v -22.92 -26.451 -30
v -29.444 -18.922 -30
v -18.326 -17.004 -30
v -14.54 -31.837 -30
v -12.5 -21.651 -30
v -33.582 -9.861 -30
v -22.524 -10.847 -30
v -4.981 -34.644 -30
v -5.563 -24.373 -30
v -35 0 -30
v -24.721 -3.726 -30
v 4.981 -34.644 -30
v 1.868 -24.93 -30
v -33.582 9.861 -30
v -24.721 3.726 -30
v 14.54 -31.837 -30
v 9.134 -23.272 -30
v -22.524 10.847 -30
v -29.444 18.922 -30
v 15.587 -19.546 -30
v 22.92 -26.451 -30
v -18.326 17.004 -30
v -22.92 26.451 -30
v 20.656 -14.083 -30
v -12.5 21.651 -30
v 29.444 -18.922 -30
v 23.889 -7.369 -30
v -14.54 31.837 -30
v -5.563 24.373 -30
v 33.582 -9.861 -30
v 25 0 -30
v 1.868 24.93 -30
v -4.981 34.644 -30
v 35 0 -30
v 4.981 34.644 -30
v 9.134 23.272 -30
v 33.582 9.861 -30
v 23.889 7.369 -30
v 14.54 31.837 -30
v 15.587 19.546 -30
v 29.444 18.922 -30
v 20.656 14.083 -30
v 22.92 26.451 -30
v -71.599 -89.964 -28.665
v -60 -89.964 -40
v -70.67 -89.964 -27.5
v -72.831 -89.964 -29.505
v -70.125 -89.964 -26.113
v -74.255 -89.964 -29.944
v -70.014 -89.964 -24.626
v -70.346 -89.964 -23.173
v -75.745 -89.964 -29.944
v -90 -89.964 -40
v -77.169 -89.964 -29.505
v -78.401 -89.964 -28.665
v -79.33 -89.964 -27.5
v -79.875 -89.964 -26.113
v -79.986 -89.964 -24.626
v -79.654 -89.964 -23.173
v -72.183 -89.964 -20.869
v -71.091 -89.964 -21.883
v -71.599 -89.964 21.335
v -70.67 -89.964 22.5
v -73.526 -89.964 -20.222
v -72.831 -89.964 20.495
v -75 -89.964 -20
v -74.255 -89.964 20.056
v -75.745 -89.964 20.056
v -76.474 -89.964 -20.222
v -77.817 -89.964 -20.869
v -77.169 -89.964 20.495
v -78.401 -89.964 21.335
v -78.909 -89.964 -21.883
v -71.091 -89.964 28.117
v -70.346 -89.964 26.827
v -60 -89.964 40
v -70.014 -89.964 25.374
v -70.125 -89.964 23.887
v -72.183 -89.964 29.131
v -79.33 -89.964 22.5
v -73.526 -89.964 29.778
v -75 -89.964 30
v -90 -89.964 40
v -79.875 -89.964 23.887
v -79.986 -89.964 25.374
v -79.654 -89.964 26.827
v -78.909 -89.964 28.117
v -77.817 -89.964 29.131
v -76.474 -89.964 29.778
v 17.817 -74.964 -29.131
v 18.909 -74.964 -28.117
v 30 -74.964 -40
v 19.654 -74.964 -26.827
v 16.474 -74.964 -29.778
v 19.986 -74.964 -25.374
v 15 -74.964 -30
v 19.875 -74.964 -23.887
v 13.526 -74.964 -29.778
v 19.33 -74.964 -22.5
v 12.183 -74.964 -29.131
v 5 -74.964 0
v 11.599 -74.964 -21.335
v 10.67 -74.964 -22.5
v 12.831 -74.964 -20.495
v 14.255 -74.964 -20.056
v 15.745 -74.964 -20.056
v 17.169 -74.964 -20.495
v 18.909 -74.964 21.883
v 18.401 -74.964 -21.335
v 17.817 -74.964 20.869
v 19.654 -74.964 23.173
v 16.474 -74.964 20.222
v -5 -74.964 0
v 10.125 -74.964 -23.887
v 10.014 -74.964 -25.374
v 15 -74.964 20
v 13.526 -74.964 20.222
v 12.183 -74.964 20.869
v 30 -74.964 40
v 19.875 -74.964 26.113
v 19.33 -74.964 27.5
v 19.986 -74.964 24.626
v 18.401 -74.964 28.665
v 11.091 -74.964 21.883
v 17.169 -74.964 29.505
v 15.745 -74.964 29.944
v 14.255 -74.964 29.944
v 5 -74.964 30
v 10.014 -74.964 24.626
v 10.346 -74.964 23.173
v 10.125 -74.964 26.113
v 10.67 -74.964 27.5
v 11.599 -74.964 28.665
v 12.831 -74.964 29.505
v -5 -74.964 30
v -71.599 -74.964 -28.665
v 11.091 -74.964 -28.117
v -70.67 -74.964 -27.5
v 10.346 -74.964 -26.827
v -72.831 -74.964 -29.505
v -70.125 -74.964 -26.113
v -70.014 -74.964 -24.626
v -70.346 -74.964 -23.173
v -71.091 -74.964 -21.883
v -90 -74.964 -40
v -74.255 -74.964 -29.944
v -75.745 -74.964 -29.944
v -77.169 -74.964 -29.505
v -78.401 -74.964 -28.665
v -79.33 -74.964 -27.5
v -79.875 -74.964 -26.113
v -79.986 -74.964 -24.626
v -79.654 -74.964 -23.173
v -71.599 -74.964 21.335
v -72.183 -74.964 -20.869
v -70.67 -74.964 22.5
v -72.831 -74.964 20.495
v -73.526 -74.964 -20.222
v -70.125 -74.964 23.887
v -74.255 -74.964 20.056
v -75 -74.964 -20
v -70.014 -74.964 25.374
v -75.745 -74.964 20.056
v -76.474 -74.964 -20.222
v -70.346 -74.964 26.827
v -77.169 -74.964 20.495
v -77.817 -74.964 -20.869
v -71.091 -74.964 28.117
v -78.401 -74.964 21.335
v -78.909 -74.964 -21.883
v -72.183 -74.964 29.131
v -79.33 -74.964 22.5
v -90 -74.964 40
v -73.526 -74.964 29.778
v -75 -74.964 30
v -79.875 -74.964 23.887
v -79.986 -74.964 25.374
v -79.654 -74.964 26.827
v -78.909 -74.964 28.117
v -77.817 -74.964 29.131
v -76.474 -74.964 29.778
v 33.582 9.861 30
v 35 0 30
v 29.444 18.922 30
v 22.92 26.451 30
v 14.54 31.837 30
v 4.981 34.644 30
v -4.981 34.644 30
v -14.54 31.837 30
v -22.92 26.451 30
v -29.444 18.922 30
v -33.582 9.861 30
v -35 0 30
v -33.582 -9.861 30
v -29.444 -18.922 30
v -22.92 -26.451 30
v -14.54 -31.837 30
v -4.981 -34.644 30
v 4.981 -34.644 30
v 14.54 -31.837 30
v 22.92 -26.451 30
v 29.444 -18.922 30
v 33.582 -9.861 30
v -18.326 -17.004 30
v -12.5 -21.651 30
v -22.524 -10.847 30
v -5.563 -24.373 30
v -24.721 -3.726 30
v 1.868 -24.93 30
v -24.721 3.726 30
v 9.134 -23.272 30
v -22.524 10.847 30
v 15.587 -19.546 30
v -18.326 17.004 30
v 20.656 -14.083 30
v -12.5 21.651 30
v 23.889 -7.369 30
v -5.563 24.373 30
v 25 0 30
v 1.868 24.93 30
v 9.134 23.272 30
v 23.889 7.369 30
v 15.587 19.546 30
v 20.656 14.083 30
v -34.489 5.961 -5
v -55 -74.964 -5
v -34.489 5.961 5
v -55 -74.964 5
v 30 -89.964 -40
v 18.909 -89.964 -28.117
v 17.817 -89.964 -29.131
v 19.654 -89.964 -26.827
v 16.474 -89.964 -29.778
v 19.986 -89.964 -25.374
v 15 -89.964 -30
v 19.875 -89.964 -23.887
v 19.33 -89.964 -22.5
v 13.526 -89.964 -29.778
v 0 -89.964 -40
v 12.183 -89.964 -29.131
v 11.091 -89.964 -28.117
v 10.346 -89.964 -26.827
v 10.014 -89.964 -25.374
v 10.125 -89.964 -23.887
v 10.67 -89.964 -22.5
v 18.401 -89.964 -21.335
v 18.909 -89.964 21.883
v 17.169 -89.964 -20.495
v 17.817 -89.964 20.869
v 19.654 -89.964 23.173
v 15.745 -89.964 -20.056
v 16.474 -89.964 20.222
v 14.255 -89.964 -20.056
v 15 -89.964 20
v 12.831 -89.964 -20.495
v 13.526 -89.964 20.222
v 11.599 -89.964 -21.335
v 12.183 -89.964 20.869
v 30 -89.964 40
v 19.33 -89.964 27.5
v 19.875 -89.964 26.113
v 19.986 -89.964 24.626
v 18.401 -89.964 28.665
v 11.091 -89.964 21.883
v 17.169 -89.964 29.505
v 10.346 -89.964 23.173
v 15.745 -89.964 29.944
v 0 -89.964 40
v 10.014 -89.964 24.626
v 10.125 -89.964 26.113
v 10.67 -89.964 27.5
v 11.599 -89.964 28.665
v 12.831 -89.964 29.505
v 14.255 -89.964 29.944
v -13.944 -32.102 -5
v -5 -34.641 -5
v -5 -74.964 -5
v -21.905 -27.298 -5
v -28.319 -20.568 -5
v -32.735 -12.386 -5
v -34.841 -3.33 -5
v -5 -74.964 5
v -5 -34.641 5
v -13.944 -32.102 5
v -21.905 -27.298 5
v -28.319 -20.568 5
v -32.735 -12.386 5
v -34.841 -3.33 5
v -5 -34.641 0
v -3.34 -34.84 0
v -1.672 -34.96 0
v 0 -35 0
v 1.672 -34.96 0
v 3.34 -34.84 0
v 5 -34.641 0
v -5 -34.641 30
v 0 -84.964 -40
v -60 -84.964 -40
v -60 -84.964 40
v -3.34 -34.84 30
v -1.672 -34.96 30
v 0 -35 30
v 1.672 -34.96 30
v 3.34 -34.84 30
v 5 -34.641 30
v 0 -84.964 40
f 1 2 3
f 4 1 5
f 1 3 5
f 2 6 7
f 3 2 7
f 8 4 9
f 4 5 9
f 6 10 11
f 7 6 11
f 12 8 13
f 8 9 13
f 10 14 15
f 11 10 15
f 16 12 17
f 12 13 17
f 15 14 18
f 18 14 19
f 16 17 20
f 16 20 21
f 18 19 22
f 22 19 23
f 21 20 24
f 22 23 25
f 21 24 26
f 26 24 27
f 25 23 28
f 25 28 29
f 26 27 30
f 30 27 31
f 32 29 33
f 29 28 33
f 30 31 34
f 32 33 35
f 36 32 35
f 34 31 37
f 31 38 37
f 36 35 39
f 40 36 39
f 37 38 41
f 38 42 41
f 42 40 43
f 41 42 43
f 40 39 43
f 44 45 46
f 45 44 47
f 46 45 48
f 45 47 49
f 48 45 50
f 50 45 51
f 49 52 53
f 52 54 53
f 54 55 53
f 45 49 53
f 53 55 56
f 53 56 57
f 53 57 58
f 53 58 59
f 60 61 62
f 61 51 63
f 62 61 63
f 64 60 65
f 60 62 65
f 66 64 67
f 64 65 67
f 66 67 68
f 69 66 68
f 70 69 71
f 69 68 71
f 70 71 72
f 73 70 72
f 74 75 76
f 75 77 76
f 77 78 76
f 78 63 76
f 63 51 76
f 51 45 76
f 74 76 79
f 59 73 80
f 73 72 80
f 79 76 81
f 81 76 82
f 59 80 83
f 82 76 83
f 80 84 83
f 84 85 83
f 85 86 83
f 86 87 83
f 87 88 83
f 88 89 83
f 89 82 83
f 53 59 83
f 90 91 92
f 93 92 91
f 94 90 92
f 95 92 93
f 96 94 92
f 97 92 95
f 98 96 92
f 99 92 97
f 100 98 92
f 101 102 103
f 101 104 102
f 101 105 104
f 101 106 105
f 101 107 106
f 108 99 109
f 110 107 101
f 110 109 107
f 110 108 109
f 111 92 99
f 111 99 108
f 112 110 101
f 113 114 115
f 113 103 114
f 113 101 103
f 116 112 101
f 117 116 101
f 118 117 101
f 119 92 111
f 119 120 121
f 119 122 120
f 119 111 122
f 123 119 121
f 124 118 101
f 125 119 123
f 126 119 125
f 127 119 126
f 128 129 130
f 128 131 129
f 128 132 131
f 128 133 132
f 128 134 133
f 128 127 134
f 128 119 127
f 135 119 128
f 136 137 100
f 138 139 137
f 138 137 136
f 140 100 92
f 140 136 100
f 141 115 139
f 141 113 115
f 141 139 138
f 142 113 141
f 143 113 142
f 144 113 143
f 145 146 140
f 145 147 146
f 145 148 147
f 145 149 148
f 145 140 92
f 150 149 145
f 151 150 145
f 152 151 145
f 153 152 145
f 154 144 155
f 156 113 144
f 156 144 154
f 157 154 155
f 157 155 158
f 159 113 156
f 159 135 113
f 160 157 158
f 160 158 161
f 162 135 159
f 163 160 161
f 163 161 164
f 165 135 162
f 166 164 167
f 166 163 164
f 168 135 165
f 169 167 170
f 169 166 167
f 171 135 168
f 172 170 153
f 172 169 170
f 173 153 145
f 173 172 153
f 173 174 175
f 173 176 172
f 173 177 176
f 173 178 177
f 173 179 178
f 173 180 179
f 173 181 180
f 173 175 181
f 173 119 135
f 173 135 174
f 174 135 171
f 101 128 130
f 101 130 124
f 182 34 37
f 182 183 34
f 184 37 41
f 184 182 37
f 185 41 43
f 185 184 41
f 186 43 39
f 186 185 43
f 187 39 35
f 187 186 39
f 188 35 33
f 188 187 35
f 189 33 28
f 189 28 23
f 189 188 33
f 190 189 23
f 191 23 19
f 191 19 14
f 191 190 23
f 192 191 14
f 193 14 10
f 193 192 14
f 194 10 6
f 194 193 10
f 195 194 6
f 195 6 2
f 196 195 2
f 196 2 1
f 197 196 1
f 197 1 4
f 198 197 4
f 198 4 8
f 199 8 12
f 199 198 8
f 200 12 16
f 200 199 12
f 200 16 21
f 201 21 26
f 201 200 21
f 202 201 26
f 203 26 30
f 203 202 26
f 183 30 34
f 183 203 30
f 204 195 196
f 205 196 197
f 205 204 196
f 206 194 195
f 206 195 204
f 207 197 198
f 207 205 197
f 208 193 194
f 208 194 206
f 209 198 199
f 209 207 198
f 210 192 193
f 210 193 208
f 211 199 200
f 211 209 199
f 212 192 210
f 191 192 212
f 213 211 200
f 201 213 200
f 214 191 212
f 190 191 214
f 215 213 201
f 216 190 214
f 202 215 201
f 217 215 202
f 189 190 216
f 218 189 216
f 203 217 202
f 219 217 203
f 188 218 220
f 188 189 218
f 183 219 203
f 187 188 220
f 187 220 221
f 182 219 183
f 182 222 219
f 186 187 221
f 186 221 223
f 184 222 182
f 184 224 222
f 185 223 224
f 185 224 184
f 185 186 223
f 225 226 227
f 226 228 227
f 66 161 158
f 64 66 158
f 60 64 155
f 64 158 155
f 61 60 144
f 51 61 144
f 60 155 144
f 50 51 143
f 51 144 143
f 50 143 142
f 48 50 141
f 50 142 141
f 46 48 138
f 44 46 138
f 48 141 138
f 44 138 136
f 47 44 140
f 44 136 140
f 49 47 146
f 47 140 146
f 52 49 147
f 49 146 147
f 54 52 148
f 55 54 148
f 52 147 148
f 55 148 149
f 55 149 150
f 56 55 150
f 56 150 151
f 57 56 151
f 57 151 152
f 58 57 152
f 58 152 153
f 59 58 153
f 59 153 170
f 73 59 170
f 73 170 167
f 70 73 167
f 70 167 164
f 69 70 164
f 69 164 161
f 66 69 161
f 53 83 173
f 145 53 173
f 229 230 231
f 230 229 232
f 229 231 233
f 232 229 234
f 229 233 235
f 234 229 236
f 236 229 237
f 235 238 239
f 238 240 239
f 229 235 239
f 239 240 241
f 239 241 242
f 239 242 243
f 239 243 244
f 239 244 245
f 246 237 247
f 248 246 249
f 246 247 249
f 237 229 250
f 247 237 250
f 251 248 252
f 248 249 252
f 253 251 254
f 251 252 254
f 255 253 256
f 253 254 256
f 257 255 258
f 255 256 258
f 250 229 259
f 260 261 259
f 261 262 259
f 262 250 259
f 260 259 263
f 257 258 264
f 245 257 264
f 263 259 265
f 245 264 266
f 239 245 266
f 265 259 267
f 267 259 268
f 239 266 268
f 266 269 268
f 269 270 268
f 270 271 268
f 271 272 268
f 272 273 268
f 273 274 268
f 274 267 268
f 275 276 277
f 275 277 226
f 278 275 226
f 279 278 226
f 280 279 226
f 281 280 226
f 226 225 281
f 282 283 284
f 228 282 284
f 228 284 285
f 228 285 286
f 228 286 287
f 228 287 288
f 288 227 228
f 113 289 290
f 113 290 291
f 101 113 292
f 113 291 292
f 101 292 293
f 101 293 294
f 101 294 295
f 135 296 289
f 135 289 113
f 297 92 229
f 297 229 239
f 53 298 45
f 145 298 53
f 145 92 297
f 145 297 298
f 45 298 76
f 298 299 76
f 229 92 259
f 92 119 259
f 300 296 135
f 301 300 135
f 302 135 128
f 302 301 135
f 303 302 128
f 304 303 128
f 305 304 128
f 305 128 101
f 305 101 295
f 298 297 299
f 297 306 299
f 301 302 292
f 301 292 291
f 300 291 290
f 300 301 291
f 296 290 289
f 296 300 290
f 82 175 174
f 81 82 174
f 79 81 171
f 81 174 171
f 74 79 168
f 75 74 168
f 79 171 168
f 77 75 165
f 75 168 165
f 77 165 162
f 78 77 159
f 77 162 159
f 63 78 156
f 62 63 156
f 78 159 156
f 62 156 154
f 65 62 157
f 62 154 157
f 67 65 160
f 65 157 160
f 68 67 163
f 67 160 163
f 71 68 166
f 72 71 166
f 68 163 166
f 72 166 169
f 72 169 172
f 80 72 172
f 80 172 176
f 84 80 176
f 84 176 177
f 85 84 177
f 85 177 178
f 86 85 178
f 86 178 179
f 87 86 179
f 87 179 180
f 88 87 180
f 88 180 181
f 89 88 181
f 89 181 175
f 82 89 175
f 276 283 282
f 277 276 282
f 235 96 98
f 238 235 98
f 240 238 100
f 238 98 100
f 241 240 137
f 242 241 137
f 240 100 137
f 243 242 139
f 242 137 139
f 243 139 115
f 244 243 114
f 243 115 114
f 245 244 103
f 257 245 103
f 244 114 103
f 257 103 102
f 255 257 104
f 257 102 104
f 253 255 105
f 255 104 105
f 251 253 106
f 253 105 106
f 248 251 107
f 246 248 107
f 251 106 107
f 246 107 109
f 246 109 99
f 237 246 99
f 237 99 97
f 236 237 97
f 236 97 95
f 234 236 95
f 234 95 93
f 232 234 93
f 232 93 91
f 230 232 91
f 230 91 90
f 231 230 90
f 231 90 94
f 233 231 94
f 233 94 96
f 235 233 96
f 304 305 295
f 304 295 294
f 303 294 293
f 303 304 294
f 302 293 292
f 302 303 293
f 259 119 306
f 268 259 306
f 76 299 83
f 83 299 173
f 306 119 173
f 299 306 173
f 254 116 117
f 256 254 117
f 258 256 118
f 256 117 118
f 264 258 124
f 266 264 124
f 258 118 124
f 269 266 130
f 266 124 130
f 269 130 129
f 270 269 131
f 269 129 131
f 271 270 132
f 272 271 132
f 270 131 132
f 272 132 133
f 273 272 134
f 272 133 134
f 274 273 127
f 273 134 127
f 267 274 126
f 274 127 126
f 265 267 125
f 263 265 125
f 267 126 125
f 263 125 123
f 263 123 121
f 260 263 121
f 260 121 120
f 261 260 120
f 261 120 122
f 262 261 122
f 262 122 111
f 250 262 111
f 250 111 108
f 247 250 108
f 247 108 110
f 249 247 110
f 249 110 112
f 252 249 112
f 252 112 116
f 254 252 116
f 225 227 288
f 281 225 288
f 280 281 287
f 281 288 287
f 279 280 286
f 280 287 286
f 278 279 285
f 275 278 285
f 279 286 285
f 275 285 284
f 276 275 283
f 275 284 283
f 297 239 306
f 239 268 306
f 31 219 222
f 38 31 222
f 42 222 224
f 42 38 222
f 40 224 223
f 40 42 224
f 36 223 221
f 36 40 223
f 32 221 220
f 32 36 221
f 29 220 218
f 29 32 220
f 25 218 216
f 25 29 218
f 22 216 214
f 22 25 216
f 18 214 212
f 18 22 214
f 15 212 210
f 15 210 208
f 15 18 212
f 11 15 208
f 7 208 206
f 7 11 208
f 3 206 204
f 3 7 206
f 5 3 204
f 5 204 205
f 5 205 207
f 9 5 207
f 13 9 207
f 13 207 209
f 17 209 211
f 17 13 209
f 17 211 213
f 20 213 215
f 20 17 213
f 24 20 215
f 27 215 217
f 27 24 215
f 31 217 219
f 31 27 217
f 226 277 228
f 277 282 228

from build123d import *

# Parameters (mm, degrees)
SKETCH3_R           = 35
SKETCH3_R_2         = 25
BOSS_EXTRUDE1_DEPTH = 30
BOSS_EXTRUDE2_DEPTH = 30
BOSS_EXTRUDE3_DEPTH = 40
BOSS_EXTRUDE4_DEPTH = 5
SKETCH9_R           = 5
CUT_EXTRUDE1_DEPTH  = 148.62165212


with BuildPart() as part:
    # Sketch3 → Boss-Extrude1 (new, symmetric)
    with BuildSketch(Plane.XY):
        Circle(SKETCH3_R)
        Circle(SKETCH3_R_2, mode=Mode.SUBTRACT)
    extrude(amount=BOSS_EXTRUDE1_DEPTH, both=True)


with BuildPart() as body_2:
    # Sketch4 → Boss-Extrude2 (new body)
    with BuildSketch(Plane.XY.offset(30)):
        with BuildLine():
            Line((0, -74.96432228), (0, -35))
            ThreePointArc((0, -35), (-2.506435188, -34.91013868), (-5, -34.641016151))
            Line((-5, -34.641016151), (-5, -74.96432228))
            Line((-5, -74.96432228), (0, -74.96432228))
        make_face()
        with BuildLine():
            ThreePointArc((5, -34.641016151), (2.506435188, -34.91013868), (0, -35))
            Line((0, -35), (0, -74.96432228))
            Line((0, -74.96432228), (5, -74.96432228))
            Line((5, -74.96432228), (5, -34.641016151))
        make_face()
    extrude(amount=-BOSS_EXTRUDE2_DEPTH)

    # Sketch5 → Boss-Extrude3 (add, symmetric)
    with BuildSketch(Plane.XY):
        Polygon((0, -74.96432228), (30, -74.96432228), (30, -89.96432228), (0, -89.96432228), (0, -84.96432228), (-60, -84.96432228), (-60, -89.96432228), (-90, -89.96432228), (-90, -74.96432228), align=None)
    extrude(amount=BOSS_EXTRUDE3_DEPTH, both=True)

    # Sketch9 → Cut-Extrude1 (cut, through all)
    with BuildSketch(Plane(origin=(0, -74.96432228, 0), x_dir=(1, 0, 0), z_dir=(0, 1, 0))):
        with Locations(Location((-75, 25, 0), (0, 0, 270))):
            Circle(SKETCH9_R)
        with Locations(Location((-75, -25, 0), (0, 0, 270))):
            Circle(SKETCH9_R)
        with Locations(Location((15, -25, 0), (0, 0, 90))):
            Circle(SKETCH9_R)
        with Locations(Location((15, 25, 0), (0, 0, 90))):
            Circle(SKETCH9_R)
    extrude(amount=-CUT_EXTRUDE1_DEPTH, mode=Mode.SUBTRACT)


with BuildPart() as body_3:
    # Sketch6 → Boss-Extrude4 (new, symmetric)
    with BuildSketch(Plane.XY):
        with BuildLine():
            Line((-5, -34.641016151), (-5, -74.96432228))
            Line((-5, -74.96432228), (-55, -74.96432228))
            Line((-55, -74.96432228), (-34.488570409, 5.96141855))
            ThreePointArc((-34.488570409, 5.96141855), (-28.319184737, -20.567541804), (-5, -34.641016151))
        make_face()
    extrude(amount=BOSS_EXTRUDE4_DEPTH, both=True)


solid = Compound([part.part, body_2.part, body_3.part])
